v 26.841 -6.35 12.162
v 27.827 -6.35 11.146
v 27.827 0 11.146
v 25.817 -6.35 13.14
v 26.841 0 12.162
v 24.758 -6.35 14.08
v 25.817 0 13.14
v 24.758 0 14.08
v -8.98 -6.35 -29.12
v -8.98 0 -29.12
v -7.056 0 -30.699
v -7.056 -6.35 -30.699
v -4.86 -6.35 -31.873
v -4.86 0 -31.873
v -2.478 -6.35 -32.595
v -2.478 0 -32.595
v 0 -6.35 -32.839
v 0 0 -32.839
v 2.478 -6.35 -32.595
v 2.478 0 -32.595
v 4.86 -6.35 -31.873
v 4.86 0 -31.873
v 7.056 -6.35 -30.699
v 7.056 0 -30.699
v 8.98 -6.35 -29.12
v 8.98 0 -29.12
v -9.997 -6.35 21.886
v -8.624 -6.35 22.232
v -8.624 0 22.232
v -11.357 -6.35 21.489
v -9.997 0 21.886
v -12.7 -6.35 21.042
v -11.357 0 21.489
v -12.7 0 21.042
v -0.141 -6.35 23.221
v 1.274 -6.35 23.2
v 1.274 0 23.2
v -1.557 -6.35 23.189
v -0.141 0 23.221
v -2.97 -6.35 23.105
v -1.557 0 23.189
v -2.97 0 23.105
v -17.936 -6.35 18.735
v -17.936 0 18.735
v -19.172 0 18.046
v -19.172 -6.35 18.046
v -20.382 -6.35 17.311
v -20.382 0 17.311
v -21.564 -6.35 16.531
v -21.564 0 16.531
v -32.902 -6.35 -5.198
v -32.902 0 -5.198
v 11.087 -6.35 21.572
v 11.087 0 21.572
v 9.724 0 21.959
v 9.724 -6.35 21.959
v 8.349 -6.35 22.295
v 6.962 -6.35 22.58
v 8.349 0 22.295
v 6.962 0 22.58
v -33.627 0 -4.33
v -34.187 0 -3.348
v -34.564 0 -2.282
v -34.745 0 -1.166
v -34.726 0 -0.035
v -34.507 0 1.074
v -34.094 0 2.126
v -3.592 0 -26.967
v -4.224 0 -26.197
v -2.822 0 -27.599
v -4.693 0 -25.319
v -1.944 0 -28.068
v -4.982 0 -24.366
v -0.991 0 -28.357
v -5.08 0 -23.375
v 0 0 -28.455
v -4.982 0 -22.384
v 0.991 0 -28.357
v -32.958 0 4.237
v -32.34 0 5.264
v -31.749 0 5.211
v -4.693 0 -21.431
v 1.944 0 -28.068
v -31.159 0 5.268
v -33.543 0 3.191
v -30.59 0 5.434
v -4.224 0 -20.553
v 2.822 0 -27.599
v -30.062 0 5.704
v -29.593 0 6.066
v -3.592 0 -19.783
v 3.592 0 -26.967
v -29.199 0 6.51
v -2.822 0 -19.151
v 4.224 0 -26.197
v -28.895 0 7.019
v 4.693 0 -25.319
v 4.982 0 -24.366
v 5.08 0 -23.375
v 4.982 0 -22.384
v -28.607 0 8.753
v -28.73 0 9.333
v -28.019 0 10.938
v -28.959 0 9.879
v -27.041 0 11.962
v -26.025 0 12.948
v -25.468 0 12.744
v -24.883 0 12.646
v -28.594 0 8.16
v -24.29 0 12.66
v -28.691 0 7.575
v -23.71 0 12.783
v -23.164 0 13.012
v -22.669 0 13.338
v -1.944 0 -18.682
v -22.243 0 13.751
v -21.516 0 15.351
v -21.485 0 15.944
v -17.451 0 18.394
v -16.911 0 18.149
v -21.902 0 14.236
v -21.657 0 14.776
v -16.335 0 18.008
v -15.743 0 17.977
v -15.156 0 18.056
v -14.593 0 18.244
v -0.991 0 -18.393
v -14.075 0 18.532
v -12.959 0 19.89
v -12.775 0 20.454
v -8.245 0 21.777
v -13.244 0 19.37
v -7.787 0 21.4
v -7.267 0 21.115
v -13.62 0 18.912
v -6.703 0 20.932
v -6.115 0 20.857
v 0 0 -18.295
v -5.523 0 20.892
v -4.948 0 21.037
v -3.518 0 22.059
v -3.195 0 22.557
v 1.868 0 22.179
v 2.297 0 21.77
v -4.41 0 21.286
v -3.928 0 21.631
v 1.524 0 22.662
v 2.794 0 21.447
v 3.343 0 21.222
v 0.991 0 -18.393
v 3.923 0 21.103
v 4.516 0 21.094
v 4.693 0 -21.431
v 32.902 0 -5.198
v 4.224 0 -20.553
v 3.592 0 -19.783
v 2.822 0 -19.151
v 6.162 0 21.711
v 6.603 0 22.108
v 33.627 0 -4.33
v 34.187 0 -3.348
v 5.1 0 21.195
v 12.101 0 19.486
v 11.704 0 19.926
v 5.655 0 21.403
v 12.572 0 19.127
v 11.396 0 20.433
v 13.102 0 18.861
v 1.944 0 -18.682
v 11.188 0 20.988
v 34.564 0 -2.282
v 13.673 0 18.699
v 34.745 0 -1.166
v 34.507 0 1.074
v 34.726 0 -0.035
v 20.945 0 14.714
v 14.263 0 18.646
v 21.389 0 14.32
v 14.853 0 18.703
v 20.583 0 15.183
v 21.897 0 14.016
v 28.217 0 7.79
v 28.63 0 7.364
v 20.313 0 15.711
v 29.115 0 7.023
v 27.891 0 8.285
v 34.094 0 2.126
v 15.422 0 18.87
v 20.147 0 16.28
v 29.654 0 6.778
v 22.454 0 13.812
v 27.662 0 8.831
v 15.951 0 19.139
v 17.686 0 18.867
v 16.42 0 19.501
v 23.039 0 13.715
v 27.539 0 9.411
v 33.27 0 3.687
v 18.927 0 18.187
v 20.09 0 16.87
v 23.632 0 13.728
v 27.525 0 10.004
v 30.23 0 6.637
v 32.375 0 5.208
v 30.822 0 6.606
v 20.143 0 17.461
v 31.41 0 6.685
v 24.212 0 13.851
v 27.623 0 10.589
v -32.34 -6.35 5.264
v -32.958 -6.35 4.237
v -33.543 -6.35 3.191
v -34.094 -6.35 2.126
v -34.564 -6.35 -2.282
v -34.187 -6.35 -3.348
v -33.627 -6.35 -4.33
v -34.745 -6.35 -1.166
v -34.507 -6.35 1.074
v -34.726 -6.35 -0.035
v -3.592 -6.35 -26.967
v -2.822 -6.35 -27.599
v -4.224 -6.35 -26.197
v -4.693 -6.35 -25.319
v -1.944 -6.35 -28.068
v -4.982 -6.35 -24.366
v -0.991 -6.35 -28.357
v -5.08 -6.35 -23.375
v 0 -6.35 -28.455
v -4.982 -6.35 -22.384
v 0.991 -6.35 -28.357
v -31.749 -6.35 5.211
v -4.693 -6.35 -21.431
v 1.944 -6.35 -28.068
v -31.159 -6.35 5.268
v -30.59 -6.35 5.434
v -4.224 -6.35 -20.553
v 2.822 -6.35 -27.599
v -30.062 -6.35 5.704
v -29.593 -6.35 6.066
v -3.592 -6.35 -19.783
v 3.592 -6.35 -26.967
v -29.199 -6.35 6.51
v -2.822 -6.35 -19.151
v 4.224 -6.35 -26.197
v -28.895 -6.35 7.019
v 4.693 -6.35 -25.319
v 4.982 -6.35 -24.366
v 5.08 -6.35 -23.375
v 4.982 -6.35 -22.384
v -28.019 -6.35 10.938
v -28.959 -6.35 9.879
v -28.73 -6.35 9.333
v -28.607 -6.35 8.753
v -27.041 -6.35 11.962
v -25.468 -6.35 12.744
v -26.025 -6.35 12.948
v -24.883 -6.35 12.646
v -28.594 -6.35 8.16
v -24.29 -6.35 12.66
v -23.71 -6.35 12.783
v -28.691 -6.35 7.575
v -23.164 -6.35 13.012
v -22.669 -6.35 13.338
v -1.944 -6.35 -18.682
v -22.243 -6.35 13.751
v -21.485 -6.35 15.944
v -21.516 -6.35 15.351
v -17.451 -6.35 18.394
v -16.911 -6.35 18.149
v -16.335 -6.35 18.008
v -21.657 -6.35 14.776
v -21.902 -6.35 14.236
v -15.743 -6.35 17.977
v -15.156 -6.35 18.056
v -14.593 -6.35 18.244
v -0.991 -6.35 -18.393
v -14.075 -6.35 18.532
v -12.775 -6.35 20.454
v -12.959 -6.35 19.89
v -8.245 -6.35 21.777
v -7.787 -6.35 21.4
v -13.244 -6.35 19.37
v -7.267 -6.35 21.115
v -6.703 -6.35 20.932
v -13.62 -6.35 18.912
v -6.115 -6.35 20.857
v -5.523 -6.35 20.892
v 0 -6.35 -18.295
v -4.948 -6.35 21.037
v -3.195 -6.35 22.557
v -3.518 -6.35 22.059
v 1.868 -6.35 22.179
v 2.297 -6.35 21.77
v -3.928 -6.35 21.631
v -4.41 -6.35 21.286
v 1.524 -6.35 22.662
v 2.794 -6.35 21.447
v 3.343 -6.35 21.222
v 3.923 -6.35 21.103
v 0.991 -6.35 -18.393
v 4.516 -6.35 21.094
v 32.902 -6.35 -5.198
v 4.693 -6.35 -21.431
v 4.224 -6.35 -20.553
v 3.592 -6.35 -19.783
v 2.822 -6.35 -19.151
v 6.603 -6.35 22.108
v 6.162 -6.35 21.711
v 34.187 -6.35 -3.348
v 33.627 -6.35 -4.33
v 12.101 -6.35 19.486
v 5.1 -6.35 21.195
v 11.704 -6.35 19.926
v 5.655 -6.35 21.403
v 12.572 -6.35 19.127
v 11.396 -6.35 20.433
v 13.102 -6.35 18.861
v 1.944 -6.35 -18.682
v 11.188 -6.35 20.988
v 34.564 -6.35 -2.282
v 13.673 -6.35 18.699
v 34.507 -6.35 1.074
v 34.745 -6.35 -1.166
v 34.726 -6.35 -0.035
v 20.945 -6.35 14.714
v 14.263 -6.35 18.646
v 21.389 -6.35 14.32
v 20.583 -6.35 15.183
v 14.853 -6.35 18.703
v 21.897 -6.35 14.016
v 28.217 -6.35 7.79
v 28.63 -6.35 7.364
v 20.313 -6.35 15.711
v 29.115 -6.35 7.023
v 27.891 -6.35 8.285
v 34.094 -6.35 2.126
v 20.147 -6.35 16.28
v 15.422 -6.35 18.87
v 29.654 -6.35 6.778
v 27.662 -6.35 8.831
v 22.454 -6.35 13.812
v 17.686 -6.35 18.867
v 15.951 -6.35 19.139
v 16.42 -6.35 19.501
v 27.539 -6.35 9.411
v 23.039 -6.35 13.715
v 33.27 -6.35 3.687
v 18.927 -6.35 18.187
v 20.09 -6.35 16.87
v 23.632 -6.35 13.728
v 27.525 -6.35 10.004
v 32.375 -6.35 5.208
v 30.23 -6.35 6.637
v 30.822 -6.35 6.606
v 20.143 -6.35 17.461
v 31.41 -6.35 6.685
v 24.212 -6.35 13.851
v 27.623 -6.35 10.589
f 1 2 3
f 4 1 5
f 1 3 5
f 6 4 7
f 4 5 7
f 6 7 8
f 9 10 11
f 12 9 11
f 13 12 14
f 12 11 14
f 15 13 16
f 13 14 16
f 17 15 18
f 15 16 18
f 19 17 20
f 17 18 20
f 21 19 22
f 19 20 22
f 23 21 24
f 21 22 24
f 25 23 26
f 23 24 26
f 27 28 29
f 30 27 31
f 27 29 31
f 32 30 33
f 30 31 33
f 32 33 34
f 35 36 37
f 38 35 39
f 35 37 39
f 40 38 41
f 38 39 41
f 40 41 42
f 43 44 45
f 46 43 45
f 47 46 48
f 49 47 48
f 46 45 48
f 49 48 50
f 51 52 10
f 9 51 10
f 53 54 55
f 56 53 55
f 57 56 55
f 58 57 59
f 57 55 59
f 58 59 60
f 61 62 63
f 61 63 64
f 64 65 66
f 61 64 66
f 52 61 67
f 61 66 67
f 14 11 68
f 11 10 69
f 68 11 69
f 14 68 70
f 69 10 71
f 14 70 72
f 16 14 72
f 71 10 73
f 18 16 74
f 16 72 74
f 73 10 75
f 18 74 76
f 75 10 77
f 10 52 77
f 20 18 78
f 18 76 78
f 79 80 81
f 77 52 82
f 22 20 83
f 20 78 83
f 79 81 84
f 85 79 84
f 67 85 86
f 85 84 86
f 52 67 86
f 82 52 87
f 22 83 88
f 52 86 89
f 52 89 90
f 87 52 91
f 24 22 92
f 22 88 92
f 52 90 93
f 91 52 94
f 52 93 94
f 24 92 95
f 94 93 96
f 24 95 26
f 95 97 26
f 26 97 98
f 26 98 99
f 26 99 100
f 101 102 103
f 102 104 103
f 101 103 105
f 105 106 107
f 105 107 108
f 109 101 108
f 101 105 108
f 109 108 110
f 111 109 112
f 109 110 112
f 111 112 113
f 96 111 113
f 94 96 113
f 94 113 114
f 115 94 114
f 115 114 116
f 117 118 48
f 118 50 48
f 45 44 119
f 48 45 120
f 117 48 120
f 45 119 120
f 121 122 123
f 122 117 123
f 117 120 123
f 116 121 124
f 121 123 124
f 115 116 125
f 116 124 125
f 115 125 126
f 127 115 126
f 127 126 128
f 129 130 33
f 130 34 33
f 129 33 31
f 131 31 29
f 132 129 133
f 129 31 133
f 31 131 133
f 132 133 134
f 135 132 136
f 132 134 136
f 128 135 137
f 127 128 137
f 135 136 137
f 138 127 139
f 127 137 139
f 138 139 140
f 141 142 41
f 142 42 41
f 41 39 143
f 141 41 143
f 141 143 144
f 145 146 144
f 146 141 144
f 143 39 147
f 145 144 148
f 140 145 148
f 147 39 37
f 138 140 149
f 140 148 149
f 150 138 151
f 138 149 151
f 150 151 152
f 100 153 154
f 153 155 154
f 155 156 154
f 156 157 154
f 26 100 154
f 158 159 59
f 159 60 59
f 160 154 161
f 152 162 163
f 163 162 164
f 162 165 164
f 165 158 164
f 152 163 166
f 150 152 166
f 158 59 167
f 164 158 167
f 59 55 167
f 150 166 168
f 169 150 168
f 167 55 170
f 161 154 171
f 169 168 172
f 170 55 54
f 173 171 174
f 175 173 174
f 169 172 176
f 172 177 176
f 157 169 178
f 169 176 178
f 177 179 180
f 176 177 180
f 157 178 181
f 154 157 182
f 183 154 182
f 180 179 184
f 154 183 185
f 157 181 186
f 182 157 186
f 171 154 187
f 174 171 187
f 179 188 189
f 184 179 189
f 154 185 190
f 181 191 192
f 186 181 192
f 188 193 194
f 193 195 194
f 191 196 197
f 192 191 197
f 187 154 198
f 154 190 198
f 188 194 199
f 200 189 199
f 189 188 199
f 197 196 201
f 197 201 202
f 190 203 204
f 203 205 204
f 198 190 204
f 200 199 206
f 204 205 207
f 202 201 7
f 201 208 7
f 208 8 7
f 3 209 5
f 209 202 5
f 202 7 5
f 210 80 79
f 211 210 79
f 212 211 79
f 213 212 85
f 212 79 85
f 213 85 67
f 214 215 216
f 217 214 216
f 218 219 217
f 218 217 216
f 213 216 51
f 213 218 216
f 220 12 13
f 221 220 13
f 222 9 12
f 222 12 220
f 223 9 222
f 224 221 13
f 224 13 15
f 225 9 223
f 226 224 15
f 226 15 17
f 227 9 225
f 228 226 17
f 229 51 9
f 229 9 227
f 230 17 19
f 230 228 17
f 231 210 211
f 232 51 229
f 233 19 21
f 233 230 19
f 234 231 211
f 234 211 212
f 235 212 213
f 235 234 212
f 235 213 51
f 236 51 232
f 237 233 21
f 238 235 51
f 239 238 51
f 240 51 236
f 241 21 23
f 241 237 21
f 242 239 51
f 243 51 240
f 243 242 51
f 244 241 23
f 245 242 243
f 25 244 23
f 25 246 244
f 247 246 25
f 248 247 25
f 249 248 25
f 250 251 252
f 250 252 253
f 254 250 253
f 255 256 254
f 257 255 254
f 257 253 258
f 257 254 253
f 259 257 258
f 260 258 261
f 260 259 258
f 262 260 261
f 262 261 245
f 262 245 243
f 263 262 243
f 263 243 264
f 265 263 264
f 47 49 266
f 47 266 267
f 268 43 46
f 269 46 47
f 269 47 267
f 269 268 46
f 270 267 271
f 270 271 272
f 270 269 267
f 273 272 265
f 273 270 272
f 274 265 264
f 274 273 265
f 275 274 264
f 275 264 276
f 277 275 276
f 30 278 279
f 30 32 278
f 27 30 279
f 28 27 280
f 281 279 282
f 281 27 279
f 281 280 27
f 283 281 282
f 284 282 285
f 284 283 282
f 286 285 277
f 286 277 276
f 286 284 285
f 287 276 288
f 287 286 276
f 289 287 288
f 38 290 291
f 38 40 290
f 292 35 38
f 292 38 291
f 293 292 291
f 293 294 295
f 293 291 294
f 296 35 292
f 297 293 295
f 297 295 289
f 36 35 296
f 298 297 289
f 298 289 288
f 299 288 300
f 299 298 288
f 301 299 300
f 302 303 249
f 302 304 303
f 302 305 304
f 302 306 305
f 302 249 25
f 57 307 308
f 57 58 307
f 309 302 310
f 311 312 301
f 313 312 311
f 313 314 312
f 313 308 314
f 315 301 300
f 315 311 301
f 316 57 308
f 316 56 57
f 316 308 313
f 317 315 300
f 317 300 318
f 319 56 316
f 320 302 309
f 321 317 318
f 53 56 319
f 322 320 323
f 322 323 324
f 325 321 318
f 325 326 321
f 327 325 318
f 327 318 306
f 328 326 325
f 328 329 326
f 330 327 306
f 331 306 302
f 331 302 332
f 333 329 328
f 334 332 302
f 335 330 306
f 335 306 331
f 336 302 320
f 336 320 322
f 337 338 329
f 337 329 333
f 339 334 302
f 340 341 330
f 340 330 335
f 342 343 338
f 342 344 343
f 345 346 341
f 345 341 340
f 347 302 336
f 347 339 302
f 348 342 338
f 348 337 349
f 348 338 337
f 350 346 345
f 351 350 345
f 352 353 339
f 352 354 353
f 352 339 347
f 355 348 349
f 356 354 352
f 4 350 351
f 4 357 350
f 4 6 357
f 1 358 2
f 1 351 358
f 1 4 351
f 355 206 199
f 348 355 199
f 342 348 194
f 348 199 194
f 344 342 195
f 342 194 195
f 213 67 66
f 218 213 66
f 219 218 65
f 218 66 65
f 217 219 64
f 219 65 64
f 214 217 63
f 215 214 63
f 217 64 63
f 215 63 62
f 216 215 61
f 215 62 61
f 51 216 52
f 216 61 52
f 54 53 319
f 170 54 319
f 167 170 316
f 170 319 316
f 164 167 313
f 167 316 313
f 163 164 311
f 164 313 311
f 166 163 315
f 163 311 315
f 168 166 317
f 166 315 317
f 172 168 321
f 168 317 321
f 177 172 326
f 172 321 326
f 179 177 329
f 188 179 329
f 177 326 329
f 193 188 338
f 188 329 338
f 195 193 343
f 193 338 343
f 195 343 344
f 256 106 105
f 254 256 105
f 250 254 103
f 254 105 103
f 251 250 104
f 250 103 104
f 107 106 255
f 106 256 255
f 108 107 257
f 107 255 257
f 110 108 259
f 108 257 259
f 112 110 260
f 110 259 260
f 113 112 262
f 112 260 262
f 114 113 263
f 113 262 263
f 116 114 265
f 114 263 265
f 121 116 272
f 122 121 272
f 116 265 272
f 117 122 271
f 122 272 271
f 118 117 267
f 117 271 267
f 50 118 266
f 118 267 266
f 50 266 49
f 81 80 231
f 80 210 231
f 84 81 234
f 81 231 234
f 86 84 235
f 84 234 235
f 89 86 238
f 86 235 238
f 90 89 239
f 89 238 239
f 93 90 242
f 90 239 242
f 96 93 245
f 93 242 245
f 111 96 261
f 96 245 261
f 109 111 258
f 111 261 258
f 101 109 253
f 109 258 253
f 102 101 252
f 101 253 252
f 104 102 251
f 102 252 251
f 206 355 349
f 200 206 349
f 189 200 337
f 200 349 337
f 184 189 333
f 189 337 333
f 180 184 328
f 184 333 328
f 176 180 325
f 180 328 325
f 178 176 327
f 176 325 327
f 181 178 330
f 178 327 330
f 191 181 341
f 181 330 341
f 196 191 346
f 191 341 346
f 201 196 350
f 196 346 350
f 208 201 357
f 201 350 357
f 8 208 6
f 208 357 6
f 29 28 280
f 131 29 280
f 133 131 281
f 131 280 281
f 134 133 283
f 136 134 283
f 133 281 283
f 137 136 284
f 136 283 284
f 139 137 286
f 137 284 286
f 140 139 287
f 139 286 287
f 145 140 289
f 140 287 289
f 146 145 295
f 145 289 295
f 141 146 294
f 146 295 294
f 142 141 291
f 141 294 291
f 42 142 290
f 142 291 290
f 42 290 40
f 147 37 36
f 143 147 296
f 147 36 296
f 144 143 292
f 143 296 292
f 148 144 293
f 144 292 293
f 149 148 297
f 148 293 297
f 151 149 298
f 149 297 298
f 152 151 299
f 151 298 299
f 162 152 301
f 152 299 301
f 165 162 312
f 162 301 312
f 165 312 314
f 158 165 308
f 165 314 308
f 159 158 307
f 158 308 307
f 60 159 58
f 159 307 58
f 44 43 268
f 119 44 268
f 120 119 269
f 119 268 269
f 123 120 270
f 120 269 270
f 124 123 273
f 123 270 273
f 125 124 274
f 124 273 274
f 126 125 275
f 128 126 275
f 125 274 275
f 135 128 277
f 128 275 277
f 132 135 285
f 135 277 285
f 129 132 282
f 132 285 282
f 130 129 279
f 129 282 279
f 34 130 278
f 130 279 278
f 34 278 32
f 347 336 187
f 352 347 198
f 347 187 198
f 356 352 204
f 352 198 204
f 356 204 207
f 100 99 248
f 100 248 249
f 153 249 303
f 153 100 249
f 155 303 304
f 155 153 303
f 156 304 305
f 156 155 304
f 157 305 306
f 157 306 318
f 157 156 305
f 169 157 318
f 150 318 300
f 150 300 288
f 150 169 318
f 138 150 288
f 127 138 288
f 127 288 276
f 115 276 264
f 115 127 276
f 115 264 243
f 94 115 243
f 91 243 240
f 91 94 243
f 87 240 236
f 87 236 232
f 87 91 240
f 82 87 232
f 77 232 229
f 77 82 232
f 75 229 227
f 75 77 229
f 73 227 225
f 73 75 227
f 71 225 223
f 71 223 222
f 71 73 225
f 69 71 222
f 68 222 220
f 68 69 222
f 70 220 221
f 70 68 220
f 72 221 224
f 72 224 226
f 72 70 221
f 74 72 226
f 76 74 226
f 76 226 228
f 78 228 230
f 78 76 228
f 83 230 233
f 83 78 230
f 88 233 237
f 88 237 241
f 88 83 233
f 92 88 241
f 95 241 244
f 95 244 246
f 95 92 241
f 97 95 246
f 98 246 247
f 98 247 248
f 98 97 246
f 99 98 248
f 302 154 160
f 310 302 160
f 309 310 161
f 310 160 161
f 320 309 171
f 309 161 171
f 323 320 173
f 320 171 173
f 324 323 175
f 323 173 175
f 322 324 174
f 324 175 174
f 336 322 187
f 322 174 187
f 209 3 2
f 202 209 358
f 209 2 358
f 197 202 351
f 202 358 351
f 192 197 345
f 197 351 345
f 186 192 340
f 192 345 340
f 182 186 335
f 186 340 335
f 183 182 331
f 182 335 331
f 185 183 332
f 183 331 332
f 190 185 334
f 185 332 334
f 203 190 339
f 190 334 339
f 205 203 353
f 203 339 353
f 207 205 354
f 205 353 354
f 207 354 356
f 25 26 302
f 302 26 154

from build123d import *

# Parameters (mm, degrees)
F0_R     = 5.08
F1_DEPTH = 6.35
F2_R     = 3.175
F3_DEPTH = 25.4


with BuildPart() as f1:
    # F0 (on Front) → F1 (new body)
    with BuildSketch(Plane.XZ):
        with BuildLine():
            Line((-32.902092, -5.197908), (-8.980256, -29.119744))
            ThreePointArc((-8.980256, -29.119744), (0, -32.839488), (8.980256, -29.119744))
            Line((8.980256, -29.119744), (32.902092, -5.197908))
            ThreePointArc((32.902092, -5.197908), (34.67947, -1.728008), (34.094357, 2.126459))
            ThreePointArc((34.094357, 2.126459), (0, 23.221024), (-34.094357, 2.126459))
            ThreePointArc((-34.094357, 2.126459), (-34.67947, -1.728008), (-32.902092, -5.197908))
        make_face()
        with Locations((0, -23.374978)):
            Circle(F0_R, mode=Mode.SUBTRACT)
    extrude(amount=F1_DEPTH)

    # F2 (on face) → F3 (cut)
    with BuildSketch(Plane.XZ.offset(6.35)):
        with Locations((-31.760779, 8.385801)):
            Circle(F2_R)
        with Locations((-24.65719, 15.813367)):
            Circle(F2_R)
        with Locations((-15.873253, 21.149301)):
            Circle(F2_R)
        with Locations((-6.007581, 24.029968)):
            Circle(F2_R)
        with Locations((4.267498, 24.259054)):
            Circle(F2_R)
        with Locations((14.251754, 21.820948)):
            Circle(F2_R)
        with Locations((23.264776, 16.881804)):
            Circle(F2_R)
        with Locations((30.692343, 9.778214)):
            Circle(F2_R)
    extrude(amount=-F3_DEPTH, mode=Mode.SUBTRACT)


solid = f1.part
